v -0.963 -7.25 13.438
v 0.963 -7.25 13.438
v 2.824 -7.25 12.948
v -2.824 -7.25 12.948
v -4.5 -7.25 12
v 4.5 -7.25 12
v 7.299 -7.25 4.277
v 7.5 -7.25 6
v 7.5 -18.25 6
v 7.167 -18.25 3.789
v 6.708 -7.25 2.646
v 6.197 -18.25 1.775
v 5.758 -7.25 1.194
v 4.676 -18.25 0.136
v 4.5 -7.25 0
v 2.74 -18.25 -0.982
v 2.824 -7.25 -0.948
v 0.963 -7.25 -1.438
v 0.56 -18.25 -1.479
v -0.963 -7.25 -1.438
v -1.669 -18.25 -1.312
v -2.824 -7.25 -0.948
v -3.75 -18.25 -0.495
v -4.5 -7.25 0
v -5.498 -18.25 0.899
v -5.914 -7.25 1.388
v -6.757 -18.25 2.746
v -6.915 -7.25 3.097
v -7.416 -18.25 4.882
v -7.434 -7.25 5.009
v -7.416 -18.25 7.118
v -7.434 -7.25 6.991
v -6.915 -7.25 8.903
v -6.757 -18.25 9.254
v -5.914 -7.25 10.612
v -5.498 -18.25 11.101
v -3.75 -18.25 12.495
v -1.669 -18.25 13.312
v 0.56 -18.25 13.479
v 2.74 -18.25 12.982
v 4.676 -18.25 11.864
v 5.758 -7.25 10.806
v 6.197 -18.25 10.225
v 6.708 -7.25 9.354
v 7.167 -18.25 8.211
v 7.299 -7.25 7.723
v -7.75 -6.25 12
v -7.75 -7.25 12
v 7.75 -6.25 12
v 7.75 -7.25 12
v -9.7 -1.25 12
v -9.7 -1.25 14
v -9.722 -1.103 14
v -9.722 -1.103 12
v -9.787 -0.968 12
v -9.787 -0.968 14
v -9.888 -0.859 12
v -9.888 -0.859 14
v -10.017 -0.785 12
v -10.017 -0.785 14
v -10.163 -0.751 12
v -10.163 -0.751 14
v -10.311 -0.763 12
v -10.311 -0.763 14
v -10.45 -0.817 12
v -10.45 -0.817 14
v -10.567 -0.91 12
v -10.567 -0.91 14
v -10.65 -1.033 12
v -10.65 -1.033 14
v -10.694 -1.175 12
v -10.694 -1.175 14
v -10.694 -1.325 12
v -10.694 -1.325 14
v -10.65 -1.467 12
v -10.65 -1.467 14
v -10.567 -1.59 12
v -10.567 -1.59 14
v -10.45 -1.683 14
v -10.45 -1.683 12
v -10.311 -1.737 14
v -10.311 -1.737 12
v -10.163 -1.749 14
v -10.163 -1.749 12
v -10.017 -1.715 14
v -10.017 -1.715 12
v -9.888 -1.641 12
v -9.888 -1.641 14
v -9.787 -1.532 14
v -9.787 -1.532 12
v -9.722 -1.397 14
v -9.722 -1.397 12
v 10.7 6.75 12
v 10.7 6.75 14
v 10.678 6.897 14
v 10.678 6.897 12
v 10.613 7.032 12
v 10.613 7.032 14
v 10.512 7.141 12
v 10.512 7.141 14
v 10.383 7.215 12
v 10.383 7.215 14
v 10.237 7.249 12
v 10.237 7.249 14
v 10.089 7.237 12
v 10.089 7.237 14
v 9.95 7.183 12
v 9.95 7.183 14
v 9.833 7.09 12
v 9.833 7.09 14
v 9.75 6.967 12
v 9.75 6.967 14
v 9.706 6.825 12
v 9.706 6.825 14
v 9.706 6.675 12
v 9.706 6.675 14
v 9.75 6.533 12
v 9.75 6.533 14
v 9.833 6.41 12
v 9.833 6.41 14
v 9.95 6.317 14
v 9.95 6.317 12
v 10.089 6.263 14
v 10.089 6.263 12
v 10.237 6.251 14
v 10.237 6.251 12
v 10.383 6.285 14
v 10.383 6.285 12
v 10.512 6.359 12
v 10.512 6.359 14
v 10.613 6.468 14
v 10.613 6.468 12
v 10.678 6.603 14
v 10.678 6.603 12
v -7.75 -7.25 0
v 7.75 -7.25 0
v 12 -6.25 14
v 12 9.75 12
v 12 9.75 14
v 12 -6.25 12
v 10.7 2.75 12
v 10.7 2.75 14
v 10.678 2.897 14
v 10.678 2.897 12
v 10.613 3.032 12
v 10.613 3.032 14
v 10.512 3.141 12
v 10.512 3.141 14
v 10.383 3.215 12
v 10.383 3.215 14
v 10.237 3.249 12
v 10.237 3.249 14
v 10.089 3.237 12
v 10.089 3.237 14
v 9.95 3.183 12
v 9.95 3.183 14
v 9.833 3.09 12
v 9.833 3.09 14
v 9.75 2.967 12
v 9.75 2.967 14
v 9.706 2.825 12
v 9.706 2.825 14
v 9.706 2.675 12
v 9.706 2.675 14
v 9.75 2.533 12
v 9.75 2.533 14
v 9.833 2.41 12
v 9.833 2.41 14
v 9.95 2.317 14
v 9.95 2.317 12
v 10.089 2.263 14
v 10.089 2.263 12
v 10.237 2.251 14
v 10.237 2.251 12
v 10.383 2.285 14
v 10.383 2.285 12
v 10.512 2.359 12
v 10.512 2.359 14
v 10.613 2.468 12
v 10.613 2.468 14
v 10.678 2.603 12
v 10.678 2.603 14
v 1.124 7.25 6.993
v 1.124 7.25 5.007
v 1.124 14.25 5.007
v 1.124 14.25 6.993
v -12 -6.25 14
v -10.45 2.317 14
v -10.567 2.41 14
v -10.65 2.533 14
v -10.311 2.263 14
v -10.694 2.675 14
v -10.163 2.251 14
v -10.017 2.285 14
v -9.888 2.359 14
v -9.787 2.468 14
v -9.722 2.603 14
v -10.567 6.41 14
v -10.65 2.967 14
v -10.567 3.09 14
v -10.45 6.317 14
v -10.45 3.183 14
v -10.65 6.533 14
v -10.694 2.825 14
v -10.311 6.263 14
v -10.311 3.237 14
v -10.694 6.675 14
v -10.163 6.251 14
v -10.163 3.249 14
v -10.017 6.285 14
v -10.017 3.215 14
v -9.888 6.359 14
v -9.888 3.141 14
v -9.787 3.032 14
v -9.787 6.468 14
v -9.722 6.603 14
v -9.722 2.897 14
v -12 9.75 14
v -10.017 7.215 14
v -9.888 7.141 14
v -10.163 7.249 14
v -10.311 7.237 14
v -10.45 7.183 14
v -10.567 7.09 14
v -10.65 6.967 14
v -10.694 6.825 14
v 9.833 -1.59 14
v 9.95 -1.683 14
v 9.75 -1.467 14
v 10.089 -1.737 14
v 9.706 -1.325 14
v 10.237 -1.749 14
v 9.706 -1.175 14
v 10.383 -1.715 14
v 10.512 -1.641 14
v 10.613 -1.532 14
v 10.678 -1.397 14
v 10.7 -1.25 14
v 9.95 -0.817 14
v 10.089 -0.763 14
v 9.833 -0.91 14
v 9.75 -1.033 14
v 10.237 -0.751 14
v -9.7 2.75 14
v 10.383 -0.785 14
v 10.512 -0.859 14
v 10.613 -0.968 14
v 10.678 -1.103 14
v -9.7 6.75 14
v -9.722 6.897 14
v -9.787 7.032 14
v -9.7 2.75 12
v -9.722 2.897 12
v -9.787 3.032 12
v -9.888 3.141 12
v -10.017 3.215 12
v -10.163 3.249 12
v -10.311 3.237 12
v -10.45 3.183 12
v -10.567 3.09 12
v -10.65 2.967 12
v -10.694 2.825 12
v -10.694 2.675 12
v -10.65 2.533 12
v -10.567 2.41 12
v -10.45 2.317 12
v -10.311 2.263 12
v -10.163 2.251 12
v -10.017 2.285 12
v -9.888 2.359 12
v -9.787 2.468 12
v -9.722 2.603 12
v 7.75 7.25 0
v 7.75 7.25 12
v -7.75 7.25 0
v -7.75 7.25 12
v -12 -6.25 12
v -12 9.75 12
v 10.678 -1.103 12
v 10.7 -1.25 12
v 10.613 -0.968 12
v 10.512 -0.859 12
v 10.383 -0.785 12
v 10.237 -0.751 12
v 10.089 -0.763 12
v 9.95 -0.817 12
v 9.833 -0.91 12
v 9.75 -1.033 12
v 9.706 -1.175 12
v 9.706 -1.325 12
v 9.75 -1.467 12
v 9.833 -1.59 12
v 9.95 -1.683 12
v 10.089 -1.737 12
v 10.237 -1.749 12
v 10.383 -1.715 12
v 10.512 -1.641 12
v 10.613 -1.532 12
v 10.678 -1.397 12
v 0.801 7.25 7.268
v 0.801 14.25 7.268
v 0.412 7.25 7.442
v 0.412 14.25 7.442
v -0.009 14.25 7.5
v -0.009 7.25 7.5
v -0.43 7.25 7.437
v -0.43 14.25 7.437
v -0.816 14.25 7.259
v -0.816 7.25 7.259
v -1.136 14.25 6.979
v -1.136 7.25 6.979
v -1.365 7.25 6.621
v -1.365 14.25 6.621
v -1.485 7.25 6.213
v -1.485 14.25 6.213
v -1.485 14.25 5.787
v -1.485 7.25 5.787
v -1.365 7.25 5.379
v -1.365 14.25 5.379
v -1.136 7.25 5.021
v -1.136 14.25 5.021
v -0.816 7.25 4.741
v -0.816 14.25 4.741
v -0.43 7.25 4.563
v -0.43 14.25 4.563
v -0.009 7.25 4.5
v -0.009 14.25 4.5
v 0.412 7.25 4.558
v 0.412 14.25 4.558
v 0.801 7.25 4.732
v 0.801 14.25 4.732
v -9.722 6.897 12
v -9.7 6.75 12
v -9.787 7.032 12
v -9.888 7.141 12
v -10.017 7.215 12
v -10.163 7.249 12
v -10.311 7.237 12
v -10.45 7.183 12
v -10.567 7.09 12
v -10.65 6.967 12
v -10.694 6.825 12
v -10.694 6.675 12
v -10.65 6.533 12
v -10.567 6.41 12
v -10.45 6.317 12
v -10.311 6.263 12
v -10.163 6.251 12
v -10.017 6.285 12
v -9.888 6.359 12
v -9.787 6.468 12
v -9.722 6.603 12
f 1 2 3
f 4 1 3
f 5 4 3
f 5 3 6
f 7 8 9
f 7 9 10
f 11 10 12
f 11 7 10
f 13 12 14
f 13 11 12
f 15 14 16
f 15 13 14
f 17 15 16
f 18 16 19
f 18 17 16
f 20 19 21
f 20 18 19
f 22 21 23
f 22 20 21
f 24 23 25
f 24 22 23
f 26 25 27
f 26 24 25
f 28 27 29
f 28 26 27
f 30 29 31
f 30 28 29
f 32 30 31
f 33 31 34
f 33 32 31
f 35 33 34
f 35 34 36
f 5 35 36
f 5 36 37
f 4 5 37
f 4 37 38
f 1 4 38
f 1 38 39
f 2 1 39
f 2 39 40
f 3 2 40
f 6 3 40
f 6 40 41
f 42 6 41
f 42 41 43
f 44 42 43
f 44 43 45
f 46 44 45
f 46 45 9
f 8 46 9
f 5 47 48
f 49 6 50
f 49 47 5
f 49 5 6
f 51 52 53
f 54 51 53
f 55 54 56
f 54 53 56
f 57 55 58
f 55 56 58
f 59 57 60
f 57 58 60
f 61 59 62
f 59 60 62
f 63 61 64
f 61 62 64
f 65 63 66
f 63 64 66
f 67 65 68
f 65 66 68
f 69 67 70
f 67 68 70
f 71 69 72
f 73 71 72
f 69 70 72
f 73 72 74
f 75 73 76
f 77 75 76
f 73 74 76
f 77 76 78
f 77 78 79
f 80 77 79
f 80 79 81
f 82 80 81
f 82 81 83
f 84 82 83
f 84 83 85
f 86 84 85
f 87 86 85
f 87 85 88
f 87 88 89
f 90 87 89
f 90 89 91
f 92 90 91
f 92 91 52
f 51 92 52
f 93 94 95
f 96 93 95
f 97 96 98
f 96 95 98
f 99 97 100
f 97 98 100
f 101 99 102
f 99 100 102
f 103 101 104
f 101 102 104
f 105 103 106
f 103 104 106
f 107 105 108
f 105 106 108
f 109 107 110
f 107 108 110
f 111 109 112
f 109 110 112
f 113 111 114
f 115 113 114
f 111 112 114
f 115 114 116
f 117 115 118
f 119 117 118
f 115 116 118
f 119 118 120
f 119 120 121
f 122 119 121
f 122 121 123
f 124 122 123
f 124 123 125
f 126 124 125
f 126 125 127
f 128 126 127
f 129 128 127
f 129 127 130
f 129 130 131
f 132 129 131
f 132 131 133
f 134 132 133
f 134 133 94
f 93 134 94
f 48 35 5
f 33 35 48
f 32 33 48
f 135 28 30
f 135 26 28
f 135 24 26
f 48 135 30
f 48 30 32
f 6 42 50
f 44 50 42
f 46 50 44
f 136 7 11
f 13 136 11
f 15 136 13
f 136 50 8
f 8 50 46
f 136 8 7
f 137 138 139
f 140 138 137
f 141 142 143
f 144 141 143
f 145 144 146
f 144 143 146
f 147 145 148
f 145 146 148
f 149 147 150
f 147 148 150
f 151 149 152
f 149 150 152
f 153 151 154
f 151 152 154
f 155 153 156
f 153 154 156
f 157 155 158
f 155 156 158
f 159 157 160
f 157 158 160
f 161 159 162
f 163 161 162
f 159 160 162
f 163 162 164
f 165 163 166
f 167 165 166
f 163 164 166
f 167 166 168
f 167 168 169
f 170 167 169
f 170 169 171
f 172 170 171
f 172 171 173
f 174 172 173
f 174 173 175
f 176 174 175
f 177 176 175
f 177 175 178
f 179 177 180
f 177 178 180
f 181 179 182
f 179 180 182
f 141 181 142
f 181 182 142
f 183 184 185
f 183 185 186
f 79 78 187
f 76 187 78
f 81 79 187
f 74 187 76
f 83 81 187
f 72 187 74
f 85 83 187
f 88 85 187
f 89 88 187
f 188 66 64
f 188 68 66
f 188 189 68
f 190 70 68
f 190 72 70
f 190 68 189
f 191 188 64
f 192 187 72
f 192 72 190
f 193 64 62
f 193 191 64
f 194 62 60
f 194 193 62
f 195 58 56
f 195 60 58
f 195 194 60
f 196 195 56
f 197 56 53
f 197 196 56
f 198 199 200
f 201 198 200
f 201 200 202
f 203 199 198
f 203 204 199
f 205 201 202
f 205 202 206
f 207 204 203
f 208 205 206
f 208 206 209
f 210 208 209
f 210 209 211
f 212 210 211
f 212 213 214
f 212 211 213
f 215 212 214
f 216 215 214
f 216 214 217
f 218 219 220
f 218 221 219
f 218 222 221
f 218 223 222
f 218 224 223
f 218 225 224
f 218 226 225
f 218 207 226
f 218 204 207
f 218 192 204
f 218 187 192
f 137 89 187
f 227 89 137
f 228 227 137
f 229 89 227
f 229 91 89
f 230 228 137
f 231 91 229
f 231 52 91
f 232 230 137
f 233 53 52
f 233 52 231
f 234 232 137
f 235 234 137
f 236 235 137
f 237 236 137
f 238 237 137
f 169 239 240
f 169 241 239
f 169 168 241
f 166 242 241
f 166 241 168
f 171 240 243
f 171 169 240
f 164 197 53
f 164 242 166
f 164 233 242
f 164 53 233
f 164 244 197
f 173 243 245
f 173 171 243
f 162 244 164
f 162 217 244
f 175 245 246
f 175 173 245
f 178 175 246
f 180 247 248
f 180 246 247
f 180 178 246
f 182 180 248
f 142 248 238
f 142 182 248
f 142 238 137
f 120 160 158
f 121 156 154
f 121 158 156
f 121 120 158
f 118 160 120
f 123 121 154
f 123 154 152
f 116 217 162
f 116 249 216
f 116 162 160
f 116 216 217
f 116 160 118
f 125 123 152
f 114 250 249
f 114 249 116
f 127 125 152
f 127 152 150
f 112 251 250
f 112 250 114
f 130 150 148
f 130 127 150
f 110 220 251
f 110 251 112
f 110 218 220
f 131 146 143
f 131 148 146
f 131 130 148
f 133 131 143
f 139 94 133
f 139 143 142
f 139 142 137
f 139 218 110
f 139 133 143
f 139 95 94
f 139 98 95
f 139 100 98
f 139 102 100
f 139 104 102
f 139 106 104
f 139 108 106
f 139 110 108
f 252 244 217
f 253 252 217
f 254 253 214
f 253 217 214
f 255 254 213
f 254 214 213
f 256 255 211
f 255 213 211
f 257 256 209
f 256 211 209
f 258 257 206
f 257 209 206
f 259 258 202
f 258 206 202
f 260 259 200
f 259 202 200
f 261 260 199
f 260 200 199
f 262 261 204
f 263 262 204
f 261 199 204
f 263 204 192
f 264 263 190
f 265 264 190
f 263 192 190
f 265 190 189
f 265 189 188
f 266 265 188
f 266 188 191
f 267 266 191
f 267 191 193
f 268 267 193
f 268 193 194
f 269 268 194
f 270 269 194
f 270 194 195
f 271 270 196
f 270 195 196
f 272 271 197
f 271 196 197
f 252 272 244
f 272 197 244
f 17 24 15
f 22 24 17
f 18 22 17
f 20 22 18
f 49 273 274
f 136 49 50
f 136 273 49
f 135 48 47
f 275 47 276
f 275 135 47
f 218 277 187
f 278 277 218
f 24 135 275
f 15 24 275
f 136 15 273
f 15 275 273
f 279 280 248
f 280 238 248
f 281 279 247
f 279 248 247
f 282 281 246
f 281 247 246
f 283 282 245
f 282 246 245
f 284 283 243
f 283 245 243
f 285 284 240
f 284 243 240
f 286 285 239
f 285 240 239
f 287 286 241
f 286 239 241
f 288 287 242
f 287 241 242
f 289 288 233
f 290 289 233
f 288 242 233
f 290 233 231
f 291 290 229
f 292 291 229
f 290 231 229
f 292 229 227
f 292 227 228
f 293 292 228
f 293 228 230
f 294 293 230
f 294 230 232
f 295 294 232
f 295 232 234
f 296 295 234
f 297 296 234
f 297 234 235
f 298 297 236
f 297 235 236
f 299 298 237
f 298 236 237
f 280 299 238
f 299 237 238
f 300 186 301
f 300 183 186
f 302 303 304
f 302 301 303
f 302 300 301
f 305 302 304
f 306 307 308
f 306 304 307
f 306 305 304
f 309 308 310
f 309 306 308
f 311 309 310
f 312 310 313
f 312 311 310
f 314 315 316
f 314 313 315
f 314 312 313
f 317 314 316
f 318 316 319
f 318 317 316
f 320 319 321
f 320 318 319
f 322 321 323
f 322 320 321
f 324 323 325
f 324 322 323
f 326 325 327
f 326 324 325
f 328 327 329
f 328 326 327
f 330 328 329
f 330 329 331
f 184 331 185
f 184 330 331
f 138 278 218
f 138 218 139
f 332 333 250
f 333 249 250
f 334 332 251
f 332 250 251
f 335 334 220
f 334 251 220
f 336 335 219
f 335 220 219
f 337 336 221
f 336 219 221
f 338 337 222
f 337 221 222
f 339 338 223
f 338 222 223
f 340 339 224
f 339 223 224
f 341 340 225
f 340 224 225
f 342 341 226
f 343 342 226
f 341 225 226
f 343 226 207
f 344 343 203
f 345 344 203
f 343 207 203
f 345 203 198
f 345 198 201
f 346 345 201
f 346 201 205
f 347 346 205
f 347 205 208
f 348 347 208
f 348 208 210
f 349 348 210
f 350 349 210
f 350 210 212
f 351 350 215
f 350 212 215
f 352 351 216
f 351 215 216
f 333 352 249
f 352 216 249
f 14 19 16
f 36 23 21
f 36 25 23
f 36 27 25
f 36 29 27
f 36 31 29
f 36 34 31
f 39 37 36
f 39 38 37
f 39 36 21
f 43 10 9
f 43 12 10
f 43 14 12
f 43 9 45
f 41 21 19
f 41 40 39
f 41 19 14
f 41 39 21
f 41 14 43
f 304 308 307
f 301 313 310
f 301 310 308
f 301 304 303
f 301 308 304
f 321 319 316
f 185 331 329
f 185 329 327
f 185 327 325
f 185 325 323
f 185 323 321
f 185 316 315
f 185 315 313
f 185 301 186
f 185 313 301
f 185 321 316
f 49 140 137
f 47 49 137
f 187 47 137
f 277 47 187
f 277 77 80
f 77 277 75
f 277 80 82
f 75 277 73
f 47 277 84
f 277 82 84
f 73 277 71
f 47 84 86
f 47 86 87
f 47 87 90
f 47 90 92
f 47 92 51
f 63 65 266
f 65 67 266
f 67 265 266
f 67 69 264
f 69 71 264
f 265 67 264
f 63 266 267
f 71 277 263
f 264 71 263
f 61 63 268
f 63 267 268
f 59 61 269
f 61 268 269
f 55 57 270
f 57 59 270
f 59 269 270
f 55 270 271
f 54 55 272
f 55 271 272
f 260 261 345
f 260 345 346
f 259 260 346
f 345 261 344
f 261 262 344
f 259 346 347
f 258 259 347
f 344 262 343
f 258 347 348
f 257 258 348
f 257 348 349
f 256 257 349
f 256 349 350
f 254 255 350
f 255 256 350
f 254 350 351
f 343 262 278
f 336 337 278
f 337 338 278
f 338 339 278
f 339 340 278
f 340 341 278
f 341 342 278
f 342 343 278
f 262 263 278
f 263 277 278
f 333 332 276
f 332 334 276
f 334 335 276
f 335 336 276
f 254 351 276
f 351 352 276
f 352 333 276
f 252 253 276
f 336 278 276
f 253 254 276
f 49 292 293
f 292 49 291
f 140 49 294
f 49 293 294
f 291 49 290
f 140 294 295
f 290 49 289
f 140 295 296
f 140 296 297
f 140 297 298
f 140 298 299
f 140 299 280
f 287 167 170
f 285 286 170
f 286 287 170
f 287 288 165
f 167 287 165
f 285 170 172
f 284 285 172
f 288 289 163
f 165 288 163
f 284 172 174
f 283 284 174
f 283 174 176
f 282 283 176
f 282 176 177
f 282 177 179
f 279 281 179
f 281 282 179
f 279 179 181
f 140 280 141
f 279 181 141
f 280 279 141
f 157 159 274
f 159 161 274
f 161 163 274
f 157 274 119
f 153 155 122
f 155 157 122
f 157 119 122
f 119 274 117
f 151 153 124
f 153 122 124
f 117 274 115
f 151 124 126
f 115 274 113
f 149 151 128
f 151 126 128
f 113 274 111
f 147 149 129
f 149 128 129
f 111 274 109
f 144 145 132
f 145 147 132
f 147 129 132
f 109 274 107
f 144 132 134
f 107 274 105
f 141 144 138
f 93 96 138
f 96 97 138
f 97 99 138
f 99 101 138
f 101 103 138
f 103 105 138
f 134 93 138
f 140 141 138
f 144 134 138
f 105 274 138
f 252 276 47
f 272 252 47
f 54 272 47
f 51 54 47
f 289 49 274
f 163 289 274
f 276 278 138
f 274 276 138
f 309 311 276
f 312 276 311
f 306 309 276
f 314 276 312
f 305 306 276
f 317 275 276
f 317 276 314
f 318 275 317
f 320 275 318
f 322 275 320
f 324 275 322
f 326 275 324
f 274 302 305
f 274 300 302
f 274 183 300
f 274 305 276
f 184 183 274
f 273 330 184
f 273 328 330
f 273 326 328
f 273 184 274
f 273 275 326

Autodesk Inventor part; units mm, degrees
ref_plane "YZ Plane" through (0, 0, 0) normal (1, 0, 0) x (0, 1, 0)
ref_plane "XZ Plane" through (0, 0, 0) normal (0, 1, 0) x (-1, 0, 0)
ref_plane "XY Plane" through (0, 0, 0) normal (0, 0, 1) x (1, 0, 0)
sketch "Skizze1" plane through (0, 0, 0) normal (0, 0, 1) x (1, 0, 0)
  line L0 (7.75, -7.25) -> (-7.75, -7.25)
  line L1 (-7.75, -7.25) -> (-7.75, 7.25)
  line L2 (-7.75, 7.25) -> (7.75, 7.25)
  line L3 (7.75, 7.25) -> (7.75, -7.25)
  line L4 (7.75, -7.25) -> (-7.75, 7.25) construction
  line L5 (-7.75, -7.25) -> (7.75, 7.25) construction
  point P0 (0, 0)
  dimension "d0" = 15.5
  dimension "d1" = 14.5
extrude "Extrusion1" add sketch "Skizze1" along normal blind 12
sketch "Skizze2" plane through (0, 0, 12) normal (0, 0, 1) x (1, 0, 0)
  line L0 (12, -6.25) -> (-12, -6.25)
  line L1 (-12, -6.25) -> (-12, 9.75)
  line L2 (-12, 9.75) -> (12, 9.75)
  line L3 (12, 9.75) -> (12, -6.25)
  line L4 (12, -6.25) -> (-12, 9.75) construction
  line L5 (-12, -6.25) -> (12, 9.75) construction
  line L6 (7.75, 7.25) -> (-7.75, 7.25) projected
  point P0 (0, 0)
  point P1 (0, 1.75)
  dimension "d4" = 24
  dimension "d5" = 16
  dimension "d6" = 2.5
extrude "Extrusion2" add sketch "Skizze2" along normal blind 2
sketch "Skizze3" plane through (-7.75, 7.25, 0) normal (0, 1, 0) x (1, 0, 0)
  line L0 (15.5, 0) -> (0, 0) projected
  line L1 (0, 0) -> (0, -12) projected
  line L2 (15.5, -12) -> (0, -12) projected
  line L3 (15.5, 0) -> (15.5, -12) projected
  circle A0 centre (7.75, -6) radius 1.5
  line L4 (8.8745, -5.0073) -> (8.8745, -6.9927)
  point P0 (7.75, 0)
  dimension "d9" = 3
  dimension "d10" = 1.1245
extrude "Extrusion3" add sketch "Skizze3" along normal blind 7 contours L4 A0 picked at (7.9997, -6)
sketch "Skizze4" plane through (-7.75, -7.25, 0) normal (0, -1, 0) x (1, 0, 0)
  line L0 (0, 0) -> (15.5, 0) projected
  line L1 (15.5, 0) -> (15.5, 12) projected
  line L2 (0, 12) -> (15.5, 12) projected
  line L3 (0, 0) -> (0, 12) projected
  arc A0 (8.8745, 6.9927) -> (8.8745, 5.0073) centre (7.75, 6) ccw projected
  circle A1 centre (7.75, 6) radius 7.5
  point P0 (7.75, 0)
  dimension "d13" = 15
extrude "Extrusion4" add sketch "Skizze4" along normal blind 11 contours A1 L2 L0 | L0 A1 | A1 L2
sketch "Skizze5" plane through (0, 0, 14) normal (0, 0, 1) x (1, 0, 0)
  line L0 (12, 9.75) -> (-12, 9.75) projected
  line L1 (-12, 9.75) -> (-12, -6.25) projected
  line L2 (-12, -6.25) -> (12, -6.25) projected
  line L3 (12, -6.25) -> (12, 9.75) projected
  line L4 (-7.75, 7.25) -> (-7.75, -6.25) projected
  line L5 (7.75, -6.25) -> (7.75, 7.25) projected
  circle A0 centre (-10.2, -1.25) radius 0.5
  circle A1 centre (-10.2, 2.75) radius 0.5
  circle A2 centre (-10.2, 6.75) radius 0.5
  line L6 (0, 9.75) -> (0, -6.25)
  line L7 (12, 9.75) -> (12, -6.25)
  line L8 (7.75, 7.25) -> (7.75, -6.25)
  circle A3 centre (10.2, -1.25) radius 0.5
  circle A4 centre (10.2, 2.75) radius 0.5
  circle A5 centre (10.2, 6.75) radius 0.5
  point P0 (0, 0)
  dimension "d16" = 1
  dimension "d17" = 1
  dimension "d18" = 1
  dimension "d19" = 5
  dimension "d20" = 4
  dimension "d21" = 4
  dimension "d22" = 1.8
  dimension "d23" = 1.8
  dimension "d24" = 1.8
extrude "Extrusion5" cut sketch "Skizze5" against normal blind 11 contours A0 | A1 | A2 | A3 | A4 | A5
properties part number "00_Micro_Stepper_15mm_Gearbox"
